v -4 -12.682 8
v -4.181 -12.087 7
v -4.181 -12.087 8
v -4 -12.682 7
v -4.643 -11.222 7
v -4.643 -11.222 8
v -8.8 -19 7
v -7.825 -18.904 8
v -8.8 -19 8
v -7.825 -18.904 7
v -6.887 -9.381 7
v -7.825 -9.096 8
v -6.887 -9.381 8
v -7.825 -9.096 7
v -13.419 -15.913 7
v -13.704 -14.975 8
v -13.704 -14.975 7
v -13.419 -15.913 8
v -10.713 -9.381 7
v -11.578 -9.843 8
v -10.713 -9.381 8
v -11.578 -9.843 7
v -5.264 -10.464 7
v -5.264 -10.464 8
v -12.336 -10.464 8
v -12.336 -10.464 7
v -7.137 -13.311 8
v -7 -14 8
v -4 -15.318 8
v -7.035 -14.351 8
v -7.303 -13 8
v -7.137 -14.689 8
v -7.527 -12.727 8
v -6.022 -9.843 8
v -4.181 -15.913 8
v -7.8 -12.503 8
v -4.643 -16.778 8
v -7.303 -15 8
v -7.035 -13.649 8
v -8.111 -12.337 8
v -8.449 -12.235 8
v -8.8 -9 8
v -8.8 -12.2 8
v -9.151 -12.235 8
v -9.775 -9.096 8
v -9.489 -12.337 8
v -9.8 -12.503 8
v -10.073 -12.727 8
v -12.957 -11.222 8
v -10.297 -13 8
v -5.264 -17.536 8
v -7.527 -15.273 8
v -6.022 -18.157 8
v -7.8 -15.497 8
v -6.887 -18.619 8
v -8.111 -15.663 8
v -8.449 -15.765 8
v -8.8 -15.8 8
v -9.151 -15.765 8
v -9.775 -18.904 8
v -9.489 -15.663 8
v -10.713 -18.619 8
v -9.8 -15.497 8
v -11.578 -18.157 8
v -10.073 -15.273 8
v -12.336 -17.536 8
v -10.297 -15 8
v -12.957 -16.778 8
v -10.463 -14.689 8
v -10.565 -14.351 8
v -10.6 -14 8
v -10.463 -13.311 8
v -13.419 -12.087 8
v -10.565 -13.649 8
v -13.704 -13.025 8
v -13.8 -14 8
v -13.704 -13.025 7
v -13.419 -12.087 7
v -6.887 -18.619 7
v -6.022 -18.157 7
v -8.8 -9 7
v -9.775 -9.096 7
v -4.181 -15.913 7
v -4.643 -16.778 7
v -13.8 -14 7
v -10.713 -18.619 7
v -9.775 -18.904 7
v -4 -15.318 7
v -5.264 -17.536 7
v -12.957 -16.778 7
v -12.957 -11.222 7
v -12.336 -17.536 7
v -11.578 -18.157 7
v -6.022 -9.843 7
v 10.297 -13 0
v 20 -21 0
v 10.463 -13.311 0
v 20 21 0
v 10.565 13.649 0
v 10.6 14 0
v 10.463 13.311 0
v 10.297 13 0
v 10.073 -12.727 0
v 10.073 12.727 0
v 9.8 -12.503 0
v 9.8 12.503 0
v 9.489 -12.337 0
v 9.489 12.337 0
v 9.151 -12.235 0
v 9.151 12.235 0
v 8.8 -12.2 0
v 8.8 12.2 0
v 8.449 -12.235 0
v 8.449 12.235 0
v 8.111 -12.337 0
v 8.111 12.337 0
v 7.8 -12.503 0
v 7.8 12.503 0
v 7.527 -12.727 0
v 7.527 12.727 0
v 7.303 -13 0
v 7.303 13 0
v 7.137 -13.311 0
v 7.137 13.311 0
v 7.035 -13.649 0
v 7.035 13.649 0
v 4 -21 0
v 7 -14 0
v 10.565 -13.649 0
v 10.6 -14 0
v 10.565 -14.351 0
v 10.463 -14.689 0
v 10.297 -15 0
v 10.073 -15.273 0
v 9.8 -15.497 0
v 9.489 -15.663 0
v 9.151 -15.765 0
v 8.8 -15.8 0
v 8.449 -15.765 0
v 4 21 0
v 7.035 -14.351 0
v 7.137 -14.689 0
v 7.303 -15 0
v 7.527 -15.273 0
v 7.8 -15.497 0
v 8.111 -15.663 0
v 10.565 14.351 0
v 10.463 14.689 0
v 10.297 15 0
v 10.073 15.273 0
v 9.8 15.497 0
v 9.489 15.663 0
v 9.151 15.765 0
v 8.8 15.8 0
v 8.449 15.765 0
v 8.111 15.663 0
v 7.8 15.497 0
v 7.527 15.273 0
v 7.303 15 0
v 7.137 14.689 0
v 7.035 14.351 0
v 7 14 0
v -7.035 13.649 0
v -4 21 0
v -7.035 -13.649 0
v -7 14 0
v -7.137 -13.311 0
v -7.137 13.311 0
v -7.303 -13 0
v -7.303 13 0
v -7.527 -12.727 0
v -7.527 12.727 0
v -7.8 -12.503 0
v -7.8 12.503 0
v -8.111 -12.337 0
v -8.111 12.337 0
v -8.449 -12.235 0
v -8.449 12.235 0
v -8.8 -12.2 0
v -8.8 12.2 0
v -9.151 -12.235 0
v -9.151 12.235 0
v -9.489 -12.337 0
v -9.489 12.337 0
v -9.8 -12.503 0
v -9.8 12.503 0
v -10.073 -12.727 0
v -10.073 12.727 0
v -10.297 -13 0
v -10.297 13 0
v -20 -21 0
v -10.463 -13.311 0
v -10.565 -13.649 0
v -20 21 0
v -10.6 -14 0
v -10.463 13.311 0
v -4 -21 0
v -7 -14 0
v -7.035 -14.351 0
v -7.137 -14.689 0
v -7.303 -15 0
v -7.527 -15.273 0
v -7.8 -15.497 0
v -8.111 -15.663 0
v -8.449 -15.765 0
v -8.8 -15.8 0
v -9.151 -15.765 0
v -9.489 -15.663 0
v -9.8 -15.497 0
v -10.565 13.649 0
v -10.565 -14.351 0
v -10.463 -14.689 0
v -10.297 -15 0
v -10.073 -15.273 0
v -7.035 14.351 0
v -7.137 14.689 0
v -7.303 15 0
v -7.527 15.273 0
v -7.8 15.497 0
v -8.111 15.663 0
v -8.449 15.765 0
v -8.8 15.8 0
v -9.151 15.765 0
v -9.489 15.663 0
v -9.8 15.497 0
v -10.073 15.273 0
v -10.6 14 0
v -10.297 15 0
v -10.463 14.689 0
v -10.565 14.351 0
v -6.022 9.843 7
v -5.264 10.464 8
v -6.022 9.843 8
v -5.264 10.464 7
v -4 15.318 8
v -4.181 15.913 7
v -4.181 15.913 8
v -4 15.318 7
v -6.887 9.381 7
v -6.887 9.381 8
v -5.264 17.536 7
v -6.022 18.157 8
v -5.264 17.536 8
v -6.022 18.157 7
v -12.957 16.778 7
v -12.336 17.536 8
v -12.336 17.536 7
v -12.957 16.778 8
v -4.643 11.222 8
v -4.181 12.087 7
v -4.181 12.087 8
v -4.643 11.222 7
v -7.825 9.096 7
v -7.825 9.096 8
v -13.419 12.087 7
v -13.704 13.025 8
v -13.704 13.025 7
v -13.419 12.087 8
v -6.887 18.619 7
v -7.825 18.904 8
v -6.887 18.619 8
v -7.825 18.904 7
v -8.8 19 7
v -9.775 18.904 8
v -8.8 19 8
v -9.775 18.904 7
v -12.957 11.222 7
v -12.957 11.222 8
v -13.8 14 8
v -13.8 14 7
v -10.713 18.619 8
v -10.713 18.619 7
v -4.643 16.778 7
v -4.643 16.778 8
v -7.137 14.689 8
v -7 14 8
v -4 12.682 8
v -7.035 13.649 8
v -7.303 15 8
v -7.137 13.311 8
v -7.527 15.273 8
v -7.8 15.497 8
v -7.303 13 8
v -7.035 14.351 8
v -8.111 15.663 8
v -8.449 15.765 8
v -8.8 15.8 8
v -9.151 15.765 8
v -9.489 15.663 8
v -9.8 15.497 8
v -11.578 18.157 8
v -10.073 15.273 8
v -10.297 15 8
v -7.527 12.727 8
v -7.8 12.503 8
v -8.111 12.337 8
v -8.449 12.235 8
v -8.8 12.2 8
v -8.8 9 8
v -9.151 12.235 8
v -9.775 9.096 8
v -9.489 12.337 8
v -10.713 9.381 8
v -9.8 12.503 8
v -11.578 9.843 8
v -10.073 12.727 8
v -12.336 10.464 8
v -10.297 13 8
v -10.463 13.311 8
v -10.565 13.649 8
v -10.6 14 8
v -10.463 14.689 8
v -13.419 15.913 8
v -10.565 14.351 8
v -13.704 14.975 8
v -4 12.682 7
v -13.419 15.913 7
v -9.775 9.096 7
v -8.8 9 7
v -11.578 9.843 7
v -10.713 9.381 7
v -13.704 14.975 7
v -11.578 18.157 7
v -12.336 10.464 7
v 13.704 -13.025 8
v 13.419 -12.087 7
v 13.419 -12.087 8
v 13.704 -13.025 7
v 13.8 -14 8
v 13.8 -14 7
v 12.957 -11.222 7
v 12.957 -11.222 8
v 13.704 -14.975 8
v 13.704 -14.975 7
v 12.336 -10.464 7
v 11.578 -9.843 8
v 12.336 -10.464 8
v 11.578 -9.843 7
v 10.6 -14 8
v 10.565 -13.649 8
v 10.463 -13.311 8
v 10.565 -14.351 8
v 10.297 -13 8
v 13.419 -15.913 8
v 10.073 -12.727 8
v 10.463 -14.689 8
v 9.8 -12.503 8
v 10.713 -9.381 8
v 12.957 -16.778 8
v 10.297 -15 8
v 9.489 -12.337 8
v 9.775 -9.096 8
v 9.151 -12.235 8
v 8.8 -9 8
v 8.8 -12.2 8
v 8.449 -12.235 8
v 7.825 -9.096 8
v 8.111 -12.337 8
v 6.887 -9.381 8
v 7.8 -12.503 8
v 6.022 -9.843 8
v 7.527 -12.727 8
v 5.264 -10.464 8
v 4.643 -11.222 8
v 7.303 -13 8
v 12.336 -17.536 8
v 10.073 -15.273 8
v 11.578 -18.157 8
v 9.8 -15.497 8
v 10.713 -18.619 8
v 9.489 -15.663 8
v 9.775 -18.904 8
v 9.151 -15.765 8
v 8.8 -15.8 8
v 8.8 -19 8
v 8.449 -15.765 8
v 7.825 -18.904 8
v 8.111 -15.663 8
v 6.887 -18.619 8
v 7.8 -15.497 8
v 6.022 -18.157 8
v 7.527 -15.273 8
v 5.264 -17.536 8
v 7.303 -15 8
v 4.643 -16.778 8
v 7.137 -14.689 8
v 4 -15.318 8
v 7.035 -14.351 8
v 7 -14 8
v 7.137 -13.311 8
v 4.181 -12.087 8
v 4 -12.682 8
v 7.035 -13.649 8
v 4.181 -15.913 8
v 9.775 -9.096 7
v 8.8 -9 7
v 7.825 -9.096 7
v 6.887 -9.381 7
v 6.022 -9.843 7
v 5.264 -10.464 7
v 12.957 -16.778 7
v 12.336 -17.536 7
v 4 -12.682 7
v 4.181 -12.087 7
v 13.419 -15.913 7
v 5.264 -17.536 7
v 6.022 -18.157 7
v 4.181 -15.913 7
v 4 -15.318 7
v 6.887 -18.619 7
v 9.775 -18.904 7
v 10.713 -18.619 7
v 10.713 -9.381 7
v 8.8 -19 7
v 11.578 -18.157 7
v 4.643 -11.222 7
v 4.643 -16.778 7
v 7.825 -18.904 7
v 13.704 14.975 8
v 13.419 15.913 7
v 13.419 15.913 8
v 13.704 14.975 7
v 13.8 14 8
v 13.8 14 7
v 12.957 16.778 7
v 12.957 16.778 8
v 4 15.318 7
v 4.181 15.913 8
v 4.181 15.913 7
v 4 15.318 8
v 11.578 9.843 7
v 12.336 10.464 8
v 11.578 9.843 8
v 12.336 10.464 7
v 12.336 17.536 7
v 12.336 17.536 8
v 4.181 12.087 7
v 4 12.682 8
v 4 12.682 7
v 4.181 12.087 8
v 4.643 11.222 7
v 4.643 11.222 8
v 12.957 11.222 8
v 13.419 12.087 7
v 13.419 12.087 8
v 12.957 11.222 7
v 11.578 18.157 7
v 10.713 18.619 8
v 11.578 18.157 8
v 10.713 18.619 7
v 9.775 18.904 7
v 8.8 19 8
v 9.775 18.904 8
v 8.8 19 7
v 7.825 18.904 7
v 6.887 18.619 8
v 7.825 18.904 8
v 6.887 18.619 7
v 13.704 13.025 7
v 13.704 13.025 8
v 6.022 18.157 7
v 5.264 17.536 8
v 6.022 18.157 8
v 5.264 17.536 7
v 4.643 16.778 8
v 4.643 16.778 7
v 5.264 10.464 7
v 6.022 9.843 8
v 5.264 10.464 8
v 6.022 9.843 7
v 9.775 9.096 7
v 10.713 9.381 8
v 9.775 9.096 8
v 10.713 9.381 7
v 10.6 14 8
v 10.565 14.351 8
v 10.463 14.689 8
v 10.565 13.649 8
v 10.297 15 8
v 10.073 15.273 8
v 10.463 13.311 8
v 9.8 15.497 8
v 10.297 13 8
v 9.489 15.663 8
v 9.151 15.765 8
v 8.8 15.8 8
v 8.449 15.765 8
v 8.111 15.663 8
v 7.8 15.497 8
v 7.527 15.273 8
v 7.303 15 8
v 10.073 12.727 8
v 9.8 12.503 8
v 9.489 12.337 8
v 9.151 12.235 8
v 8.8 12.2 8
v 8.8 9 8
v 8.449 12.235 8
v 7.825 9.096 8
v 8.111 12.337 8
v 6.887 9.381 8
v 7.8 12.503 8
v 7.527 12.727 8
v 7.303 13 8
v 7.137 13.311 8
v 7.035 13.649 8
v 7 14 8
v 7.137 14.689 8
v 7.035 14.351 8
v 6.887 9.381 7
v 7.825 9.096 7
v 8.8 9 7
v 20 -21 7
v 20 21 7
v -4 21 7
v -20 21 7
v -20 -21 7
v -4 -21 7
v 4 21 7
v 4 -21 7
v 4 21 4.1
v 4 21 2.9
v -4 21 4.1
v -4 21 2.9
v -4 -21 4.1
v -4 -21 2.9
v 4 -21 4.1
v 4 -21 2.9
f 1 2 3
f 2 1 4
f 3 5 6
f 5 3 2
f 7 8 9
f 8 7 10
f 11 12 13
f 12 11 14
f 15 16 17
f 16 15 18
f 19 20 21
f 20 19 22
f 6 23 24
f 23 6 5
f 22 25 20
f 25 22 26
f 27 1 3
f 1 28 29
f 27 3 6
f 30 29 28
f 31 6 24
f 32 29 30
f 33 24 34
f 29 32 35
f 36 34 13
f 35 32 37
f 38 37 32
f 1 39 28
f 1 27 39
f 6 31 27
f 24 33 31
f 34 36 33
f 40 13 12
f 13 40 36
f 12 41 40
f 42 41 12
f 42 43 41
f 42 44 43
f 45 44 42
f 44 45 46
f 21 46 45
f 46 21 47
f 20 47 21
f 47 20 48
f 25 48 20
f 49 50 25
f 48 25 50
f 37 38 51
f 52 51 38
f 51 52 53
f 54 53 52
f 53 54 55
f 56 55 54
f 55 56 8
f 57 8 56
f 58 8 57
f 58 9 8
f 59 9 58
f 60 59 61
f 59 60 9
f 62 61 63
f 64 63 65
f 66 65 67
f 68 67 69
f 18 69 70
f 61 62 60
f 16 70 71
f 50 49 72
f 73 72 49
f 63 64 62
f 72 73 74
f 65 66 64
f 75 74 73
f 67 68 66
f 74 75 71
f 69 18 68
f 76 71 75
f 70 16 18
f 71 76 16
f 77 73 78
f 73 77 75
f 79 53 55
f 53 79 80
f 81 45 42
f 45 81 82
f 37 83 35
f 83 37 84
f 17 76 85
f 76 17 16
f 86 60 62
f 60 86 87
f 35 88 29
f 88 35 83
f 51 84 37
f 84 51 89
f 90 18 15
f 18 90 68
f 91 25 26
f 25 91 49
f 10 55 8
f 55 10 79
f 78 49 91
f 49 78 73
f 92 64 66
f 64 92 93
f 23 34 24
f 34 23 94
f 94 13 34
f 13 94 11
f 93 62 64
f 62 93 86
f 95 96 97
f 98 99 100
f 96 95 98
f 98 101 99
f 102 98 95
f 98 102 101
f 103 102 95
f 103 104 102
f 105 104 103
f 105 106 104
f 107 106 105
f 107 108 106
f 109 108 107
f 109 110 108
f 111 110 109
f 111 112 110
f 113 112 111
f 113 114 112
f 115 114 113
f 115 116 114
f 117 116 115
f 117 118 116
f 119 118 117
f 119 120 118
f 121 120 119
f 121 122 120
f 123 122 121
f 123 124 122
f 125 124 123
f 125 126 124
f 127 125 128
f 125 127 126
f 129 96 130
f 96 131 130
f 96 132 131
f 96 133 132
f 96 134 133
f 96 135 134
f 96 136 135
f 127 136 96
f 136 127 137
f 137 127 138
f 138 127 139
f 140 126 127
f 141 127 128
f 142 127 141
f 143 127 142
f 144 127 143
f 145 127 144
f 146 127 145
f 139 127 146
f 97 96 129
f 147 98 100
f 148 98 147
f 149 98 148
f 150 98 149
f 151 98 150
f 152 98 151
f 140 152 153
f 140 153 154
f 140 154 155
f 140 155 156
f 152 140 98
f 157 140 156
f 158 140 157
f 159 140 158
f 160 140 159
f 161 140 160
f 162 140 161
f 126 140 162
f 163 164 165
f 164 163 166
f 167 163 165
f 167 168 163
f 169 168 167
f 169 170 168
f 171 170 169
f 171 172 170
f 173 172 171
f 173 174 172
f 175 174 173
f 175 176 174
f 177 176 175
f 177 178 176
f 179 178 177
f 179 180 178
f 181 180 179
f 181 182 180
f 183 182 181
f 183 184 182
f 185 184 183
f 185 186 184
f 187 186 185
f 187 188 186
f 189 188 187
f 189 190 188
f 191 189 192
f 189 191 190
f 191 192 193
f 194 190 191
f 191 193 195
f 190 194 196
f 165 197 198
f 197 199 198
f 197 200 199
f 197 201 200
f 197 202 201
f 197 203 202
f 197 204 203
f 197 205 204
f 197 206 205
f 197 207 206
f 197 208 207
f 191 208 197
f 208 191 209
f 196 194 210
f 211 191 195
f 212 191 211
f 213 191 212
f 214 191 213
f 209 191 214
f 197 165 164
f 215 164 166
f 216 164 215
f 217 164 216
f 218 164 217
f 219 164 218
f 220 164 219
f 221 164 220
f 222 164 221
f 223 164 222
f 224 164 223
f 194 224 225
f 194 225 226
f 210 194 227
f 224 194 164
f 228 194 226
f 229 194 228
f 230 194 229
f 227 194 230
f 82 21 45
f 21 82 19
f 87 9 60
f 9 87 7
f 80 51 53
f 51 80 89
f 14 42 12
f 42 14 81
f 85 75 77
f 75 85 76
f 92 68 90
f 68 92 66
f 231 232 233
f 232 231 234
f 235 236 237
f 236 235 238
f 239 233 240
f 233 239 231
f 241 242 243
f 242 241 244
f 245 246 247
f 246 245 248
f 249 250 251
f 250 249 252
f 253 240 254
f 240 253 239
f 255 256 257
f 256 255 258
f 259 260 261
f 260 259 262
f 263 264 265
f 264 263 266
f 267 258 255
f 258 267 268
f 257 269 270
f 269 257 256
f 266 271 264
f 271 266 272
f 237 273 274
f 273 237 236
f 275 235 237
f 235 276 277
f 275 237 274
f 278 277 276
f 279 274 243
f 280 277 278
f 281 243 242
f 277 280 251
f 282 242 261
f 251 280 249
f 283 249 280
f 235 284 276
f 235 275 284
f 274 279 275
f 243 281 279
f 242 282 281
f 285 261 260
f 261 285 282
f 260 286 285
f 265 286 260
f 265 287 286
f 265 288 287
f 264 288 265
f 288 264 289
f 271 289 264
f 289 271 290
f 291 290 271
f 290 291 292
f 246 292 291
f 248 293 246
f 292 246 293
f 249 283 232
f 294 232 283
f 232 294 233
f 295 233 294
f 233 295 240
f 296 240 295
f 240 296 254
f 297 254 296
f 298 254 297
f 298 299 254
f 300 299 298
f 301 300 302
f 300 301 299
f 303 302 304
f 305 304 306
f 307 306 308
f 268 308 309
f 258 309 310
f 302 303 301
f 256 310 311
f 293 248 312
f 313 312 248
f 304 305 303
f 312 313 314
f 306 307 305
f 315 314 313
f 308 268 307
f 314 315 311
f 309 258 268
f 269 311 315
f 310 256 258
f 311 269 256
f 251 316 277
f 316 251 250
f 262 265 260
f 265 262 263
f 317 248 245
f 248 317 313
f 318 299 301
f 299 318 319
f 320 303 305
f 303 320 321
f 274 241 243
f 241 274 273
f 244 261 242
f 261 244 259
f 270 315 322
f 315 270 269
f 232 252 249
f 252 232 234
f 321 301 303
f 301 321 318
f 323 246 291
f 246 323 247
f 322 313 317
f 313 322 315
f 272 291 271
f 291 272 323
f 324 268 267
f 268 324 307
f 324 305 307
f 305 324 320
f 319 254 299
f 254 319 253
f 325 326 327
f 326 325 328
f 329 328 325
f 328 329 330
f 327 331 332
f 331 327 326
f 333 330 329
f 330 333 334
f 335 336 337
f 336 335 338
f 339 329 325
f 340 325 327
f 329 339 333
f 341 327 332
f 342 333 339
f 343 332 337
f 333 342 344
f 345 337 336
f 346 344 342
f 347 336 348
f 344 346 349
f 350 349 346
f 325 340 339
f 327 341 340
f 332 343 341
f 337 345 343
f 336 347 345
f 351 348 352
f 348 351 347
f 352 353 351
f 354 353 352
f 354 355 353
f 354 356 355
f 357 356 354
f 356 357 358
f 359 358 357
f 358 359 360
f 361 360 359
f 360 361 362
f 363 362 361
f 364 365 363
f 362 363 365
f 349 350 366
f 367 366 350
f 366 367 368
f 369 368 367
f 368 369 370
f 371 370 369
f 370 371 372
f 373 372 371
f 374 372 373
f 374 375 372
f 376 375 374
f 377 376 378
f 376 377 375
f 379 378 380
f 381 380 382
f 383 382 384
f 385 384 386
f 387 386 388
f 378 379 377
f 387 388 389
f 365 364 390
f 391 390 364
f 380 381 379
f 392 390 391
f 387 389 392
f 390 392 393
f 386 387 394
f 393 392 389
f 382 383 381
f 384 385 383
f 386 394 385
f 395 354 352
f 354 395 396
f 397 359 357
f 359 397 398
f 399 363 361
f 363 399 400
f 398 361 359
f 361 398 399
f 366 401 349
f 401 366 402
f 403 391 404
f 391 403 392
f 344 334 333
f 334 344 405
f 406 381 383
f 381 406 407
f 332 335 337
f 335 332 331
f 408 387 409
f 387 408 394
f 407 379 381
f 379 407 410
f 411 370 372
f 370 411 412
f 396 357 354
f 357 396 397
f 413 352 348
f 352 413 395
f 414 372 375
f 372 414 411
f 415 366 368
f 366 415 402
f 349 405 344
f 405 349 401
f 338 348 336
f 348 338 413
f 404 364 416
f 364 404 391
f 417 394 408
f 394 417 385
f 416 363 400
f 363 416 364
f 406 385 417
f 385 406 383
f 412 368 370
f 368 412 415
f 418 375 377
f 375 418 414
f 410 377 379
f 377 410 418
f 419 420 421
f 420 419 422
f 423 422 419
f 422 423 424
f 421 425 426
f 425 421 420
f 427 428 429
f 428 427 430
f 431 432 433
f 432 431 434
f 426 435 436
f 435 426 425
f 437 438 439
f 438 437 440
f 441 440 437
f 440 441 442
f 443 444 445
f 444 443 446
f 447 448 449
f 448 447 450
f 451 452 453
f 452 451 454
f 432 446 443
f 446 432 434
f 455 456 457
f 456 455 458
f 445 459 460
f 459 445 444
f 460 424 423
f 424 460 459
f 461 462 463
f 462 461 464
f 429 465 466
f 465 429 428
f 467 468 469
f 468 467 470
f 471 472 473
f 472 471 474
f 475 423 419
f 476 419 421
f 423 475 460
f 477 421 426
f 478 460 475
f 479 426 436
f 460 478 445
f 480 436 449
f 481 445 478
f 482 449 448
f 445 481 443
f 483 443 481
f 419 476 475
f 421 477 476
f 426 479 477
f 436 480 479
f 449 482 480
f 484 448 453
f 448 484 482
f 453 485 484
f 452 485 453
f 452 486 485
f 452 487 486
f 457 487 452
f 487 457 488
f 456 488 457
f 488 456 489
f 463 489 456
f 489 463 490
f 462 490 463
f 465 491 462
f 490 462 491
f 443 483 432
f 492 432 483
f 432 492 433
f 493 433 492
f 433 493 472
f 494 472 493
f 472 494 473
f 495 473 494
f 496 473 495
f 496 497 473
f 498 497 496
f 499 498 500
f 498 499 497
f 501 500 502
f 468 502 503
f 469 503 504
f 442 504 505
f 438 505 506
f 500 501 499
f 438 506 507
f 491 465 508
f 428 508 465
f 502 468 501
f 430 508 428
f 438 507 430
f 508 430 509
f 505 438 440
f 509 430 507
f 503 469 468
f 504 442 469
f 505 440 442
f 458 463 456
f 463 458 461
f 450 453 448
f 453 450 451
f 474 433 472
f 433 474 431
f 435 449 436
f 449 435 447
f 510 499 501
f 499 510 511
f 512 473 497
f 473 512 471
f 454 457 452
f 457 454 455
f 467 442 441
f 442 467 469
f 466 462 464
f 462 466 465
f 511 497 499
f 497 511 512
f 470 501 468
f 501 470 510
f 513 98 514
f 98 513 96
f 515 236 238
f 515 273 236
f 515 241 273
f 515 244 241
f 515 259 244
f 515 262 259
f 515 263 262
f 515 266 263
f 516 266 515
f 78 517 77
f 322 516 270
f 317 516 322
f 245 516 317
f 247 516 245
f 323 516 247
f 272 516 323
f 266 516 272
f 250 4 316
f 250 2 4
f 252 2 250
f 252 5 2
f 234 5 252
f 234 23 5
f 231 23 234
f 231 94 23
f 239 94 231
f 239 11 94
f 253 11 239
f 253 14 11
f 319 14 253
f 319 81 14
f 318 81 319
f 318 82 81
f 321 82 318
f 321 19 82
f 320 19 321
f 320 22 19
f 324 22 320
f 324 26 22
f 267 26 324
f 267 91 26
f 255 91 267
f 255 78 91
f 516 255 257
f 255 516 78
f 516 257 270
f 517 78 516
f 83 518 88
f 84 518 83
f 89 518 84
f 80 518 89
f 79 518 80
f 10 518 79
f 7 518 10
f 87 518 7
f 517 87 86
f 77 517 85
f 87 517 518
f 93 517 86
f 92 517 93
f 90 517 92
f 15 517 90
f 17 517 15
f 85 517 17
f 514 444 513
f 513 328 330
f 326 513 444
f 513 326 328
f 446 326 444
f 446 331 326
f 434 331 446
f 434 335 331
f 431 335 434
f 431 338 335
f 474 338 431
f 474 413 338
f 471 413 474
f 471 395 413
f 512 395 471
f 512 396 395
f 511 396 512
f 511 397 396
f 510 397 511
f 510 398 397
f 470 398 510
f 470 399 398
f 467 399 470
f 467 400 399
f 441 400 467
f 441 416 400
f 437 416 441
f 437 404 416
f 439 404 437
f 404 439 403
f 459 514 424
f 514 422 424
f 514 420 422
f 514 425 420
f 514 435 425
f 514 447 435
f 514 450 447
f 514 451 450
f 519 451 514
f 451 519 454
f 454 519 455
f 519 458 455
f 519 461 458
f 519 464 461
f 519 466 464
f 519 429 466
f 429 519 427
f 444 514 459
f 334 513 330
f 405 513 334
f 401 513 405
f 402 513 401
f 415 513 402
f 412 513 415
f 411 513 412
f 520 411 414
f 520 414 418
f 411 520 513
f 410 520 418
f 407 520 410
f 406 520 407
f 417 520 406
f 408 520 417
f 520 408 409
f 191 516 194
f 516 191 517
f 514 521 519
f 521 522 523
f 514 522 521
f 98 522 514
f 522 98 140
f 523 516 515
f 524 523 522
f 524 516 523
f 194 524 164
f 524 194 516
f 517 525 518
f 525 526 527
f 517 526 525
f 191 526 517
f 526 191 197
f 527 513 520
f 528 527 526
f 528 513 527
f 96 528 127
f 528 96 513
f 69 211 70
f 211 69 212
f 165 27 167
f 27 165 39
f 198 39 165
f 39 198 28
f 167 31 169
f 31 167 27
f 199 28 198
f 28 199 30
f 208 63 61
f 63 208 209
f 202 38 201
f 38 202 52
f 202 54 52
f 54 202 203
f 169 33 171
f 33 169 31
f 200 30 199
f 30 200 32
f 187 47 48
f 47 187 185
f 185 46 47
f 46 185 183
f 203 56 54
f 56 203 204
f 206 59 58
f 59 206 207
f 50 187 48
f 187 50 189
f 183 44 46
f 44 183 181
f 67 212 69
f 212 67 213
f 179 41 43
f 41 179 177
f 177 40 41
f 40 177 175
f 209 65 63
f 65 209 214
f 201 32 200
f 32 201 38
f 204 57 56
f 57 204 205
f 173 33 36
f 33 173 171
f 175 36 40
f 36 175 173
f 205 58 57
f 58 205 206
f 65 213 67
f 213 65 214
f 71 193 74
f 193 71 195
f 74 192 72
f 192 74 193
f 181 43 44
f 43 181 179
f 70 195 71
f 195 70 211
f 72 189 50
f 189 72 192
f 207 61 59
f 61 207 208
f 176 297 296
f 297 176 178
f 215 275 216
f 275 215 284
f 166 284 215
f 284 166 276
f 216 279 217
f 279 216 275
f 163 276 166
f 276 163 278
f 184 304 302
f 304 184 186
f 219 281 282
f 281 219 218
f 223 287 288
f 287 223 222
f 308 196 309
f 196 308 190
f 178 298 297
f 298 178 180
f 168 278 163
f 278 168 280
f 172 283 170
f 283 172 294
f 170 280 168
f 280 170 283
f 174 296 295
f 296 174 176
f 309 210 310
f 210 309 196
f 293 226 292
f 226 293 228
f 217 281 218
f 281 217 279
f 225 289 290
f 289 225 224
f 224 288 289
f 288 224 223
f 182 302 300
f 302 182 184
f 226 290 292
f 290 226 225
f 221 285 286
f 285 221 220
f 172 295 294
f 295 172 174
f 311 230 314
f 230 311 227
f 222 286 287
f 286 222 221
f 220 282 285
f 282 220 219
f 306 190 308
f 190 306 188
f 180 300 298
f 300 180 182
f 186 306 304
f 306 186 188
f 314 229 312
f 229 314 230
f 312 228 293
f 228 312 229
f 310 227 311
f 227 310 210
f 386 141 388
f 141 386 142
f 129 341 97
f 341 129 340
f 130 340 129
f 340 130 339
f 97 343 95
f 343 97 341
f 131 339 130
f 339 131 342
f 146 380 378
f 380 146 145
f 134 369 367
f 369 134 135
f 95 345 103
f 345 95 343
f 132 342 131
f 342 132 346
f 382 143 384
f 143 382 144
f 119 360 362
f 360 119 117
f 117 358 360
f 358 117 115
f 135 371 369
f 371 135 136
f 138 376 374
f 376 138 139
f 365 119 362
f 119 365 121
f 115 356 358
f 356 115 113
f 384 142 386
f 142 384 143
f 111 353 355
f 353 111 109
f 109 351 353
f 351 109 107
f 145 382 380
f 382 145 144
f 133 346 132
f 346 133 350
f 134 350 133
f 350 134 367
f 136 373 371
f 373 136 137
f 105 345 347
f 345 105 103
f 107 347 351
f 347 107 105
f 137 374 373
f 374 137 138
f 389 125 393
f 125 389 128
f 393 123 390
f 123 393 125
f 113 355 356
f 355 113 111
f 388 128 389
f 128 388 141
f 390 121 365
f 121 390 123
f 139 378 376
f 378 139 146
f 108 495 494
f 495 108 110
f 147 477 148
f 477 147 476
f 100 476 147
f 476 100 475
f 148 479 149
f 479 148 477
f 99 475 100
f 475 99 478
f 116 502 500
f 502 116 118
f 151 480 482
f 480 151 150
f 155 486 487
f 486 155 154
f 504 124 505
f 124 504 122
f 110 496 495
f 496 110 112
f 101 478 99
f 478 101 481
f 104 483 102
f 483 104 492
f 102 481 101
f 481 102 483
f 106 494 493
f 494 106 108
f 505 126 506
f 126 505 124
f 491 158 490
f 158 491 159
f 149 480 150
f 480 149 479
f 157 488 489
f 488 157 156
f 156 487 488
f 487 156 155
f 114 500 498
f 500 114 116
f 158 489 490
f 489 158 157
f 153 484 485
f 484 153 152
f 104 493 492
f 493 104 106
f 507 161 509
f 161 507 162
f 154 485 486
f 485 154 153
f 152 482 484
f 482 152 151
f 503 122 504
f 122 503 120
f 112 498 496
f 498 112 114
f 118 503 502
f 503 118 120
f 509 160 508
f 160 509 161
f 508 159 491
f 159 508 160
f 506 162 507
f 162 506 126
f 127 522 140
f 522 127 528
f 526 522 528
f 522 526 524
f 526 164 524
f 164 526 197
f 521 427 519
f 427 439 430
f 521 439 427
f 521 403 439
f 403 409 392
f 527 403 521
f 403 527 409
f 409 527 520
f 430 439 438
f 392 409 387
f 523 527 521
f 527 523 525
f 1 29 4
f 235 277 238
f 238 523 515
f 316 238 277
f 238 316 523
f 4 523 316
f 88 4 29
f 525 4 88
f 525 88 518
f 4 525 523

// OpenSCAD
$fn = 32;

// ----------------------------------------------------------------------
// Living hinge: 40 x 42 mm plates, 1.2 mm flexible web
// ----------------------------------------------------------------------

// --- parameters (mm) ---
plate_len = 16;           // plate length outside the web
plate_w = 42;             // plate width
thick = 7;                // plate thickness
web_half = 4;             // half width of the flex band
web_t = 1.2;              // flexible web thickness
web_z = 2.9;              // web position inside the thickness
boss_d = 10;              // screw boss diameter
boss_h = 8;               // screw boss height
boss_x = 8.8;             // screw boss distance from the web
screw_d = 3.6;            // screw hole

difference() {
  union() {
    /* one flat strip, later thinned at the middle */
    translate([-20, -21, 0]) cube([40, 42, 7]);
    /* screw bosses, sunk 0.5 mm into the plates */
    for (sx = [-8.8, 8.8]) {
      for (sy = [-14, 14]) {
        translate([sx, sy, 0]) cylinder(h = boss_h, d = boss_d);
      }
    }
  }
  /* channel from below: leaves the web on top of it */
  translate([-4, -23.5, -2.5]) cube([8, 47, 5.4]);
  /* channel from above: thins the web down to web_t */
  translate([-4, -23.5, 4.1]) cube([8, 47, 5.4]);
  /* screw holes through the bosses */
  for (sx = [-8.8, 8.8]) {
    for (sy = [-14, 14]) {
      translate([sx, sy, -2.5]) cylinder(h = boss_h + 5, d = screw_d);
    }
  }
}
